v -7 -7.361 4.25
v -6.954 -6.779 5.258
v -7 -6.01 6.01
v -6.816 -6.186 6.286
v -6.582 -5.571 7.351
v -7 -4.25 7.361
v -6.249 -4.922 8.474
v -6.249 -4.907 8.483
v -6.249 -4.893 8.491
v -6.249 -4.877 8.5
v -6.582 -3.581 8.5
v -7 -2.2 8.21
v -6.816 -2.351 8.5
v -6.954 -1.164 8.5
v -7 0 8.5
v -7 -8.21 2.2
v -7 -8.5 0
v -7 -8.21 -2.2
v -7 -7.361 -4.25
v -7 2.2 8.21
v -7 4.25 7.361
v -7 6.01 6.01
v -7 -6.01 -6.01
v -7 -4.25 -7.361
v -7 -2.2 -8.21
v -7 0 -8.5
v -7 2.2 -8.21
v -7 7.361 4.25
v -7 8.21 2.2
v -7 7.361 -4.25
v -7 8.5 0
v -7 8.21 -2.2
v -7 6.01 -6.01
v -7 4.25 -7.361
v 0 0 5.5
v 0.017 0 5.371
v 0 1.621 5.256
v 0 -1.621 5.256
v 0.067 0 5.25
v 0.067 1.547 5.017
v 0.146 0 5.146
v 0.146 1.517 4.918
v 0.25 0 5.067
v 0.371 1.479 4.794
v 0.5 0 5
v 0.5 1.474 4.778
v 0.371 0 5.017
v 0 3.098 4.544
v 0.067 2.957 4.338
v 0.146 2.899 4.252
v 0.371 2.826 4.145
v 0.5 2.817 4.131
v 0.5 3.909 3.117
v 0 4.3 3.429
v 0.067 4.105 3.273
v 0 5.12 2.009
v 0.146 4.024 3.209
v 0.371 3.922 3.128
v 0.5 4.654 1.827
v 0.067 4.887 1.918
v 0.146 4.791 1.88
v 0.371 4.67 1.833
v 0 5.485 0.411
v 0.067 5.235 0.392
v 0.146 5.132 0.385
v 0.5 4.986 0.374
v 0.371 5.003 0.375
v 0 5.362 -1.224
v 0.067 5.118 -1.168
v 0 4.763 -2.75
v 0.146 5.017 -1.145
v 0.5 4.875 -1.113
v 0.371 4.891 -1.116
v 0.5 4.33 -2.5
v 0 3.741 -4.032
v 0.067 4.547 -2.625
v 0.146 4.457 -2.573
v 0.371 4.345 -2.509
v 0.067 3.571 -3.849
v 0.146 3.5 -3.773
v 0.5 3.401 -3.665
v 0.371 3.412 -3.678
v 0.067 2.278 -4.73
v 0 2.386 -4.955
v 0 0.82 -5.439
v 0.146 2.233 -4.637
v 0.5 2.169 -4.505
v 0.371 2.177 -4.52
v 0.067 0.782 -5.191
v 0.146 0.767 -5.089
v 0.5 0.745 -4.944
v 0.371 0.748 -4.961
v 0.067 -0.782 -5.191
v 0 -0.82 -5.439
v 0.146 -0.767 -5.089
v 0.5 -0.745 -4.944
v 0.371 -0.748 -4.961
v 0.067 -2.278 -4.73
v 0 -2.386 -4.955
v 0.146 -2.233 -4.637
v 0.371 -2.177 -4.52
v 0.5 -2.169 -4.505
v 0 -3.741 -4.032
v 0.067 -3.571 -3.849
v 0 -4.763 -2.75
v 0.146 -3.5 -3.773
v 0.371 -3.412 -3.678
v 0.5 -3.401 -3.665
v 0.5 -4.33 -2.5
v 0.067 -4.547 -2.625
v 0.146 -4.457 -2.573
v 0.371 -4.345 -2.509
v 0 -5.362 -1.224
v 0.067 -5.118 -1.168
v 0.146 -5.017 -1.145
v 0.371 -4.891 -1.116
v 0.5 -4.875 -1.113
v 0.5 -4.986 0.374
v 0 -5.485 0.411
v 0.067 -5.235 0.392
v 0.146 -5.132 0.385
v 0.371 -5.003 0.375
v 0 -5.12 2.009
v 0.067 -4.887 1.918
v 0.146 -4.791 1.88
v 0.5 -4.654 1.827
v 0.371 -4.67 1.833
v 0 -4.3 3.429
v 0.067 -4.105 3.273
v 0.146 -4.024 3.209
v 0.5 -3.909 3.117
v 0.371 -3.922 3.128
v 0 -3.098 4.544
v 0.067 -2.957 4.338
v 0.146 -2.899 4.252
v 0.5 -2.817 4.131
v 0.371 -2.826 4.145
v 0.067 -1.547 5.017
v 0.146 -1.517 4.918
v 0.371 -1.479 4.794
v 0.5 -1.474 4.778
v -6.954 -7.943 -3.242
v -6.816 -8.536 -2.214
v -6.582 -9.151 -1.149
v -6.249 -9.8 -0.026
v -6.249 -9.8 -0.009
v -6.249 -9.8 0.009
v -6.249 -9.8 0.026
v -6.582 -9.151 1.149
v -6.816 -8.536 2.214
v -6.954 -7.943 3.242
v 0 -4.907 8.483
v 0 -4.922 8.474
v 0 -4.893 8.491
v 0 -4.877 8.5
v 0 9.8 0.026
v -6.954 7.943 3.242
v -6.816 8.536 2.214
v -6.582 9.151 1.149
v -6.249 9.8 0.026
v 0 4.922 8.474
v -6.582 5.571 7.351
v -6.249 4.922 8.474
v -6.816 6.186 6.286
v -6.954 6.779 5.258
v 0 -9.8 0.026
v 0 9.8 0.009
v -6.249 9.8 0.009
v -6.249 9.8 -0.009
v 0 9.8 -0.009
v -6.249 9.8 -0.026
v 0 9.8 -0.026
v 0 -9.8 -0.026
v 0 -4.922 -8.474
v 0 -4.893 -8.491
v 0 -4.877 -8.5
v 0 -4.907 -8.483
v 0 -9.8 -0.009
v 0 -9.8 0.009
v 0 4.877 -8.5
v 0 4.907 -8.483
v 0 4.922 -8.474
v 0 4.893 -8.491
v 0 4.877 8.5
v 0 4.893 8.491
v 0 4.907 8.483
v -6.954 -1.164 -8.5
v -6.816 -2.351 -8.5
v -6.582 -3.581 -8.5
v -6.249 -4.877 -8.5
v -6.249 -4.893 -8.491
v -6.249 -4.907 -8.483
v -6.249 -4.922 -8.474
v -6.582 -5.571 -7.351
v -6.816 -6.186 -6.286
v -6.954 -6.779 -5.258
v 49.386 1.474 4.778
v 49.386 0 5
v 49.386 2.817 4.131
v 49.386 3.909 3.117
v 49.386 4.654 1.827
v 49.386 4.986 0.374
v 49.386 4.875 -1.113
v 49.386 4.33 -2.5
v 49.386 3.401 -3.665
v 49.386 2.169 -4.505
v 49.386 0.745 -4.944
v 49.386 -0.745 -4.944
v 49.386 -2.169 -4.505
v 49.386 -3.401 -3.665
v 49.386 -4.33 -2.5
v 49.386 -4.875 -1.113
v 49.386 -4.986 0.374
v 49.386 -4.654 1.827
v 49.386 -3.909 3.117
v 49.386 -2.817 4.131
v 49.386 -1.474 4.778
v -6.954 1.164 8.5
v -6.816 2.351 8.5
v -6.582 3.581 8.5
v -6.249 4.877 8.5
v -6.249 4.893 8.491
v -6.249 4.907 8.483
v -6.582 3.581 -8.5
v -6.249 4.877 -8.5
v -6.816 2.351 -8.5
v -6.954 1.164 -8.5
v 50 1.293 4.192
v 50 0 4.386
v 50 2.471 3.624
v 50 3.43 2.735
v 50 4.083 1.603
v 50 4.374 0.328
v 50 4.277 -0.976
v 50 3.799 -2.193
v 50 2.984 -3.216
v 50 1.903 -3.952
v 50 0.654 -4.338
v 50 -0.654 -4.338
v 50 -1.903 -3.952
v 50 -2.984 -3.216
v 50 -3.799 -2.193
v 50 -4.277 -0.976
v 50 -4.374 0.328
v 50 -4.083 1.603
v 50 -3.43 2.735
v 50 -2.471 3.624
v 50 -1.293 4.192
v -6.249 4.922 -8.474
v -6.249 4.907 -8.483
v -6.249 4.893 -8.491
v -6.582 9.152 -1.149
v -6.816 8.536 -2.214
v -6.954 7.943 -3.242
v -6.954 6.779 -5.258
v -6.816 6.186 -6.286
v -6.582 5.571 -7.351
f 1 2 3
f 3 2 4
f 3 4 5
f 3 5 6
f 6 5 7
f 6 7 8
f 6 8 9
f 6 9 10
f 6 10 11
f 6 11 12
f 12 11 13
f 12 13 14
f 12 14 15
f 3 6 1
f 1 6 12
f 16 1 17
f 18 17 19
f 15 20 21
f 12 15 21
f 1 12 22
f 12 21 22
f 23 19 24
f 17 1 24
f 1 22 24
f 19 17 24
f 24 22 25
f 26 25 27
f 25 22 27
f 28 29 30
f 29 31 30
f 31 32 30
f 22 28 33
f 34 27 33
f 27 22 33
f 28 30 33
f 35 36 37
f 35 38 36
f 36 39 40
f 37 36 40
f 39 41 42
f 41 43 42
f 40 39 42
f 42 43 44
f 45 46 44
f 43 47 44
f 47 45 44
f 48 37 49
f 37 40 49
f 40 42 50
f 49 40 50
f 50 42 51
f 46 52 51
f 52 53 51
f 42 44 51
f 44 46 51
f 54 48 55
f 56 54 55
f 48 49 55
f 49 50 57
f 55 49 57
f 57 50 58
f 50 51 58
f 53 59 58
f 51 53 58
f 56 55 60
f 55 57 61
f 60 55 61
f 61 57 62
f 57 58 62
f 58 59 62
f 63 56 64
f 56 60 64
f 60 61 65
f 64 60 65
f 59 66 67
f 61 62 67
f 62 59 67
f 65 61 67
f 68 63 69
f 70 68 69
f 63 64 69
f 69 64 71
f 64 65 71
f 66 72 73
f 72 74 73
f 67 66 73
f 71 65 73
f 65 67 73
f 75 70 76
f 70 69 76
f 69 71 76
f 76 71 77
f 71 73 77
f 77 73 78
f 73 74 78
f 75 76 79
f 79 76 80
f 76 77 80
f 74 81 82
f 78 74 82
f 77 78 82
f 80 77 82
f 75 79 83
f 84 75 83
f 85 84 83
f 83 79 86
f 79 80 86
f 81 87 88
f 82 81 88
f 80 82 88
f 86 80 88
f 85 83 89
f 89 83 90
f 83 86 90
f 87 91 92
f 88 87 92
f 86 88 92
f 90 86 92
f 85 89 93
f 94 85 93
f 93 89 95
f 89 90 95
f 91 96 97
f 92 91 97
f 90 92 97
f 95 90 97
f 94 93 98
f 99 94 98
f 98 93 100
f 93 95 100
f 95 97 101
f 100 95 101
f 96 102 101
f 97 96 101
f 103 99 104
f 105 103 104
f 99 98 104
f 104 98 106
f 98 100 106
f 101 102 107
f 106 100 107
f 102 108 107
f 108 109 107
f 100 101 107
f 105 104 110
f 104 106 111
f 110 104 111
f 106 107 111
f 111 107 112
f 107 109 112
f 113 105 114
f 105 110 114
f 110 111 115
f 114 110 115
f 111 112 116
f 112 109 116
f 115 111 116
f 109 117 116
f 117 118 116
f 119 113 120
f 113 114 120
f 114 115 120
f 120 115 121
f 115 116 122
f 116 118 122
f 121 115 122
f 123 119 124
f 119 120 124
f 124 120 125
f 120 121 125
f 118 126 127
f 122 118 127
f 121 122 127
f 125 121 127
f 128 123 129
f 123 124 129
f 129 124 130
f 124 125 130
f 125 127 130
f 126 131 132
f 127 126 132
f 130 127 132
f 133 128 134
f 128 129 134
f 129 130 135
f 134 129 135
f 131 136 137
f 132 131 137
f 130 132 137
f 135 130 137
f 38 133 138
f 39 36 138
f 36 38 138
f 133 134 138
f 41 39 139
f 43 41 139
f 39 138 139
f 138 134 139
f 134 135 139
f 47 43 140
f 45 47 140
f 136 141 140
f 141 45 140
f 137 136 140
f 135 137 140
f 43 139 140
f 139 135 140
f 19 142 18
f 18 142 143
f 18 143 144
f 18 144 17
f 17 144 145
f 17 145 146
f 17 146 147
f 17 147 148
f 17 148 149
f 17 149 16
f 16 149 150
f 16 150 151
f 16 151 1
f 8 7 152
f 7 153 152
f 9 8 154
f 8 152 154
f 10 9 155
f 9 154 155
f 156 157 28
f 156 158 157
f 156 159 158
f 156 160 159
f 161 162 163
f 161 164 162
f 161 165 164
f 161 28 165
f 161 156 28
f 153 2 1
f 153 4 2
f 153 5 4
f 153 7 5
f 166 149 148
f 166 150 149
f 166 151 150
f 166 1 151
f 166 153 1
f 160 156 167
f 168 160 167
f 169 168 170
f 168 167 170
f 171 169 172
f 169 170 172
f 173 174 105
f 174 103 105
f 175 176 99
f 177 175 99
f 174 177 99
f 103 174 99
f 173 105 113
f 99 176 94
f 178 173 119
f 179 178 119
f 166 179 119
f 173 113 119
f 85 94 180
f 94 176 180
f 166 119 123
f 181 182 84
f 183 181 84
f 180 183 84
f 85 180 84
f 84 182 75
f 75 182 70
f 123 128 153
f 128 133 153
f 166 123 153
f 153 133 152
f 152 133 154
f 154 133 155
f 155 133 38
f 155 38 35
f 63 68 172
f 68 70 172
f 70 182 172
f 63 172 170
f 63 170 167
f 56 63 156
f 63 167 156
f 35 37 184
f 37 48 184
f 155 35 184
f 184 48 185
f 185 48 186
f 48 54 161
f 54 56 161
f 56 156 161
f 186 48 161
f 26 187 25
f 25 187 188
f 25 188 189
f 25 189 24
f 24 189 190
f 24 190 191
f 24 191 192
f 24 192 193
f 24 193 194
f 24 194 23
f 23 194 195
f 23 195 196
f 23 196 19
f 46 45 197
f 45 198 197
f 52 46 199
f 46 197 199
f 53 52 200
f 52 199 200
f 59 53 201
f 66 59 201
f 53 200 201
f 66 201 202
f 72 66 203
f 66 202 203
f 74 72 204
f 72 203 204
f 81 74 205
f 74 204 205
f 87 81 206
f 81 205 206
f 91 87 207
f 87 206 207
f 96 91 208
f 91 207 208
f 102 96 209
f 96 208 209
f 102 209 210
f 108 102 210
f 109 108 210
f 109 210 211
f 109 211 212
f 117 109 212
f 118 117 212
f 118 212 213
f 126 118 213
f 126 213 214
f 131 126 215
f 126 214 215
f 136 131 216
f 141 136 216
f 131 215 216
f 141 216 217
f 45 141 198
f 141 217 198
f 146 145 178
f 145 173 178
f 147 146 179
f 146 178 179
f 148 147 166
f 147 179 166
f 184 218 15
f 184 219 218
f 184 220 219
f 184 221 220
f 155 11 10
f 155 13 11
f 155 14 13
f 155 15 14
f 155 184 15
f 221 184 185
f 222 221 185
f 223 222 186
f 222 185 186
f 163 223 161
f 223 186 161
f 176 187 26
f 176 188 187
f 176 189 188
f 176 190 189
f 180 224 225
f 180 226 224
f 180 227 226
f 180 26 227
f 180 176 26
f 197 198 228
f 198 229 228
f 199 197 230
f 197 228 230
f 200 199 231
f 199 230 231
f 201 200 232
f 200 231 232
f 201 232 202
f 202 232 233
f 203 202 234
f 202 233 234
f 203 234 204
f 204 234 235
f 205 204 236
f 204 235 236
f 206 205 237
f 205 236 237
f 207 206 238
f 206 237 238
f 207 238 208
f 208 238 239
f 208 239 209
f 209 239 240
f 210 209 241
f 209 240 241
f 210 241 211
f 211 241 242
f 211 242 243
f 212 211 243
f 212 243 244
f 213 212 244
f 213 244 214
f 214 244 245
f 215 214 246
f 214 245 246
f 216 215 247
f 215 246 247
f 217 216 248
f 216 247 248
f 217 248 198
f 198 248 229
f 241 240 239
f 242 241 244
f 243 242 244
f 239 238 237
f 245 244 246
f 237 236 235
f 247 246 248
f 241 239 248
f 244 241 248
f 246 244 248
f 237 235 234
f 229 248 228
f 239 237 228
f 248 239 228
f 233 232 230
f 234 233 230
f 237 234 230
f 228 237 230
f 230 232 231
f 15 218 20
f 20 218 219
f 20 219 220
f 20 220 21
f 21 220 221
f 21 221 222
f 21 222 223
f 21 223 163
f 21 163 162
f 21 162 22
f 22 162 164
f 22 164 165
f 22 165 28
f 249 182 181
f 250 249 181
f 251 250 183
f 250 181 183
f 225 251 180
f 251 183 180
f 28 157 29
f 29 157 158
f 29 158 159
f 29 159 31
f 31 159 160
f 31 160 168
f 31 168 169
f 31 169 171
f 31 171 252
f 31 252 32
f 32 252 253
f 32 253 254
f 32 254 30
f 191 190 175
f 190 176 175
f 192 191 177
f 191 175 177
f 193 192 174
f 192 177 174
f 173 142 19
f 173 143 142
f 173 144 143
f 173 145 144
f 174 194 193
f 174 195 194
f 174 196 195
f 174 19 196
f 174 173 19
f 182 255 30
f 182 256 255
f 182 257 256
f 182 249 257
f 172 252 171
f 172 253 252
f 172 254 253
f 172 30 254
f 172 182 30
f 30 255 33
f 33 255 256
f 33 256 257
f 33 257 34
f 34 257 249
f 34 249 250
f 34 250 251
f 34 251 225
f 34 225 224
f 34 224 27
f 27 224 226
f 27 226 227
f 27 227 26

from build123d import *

# Parameters (mm, degrees)
SKETCH2_W          = 39.2
SKETCH2_H          = 39.2
CUT_EXTRUDE1_DEPTH = 7


with BuildPart() as part:
    # Sketch1 → Revolve1 (revolve)
    with BuildSketch(Plane.XY, mode=Mode.PRIVATE) as revolve1_sk:
        with BuildLine():
            Line((-7, 0), (-7, 8.5))
            Line((-7, 8.5), (-6.24944465, 9.8))
            Line((-6.24944465, 9.8), (0, 9.8))
            Line((0, 9.8), (0, 5.5))
            ThreePointArc((0, 5.5), (0.146446609, 5.146446609), (0.5, 5))
            Line((0.5, 5), (49.3865, 5))
            Line((49.3865, 5), (50, 4.3865))
            Line((50, 4.3865), (50, 0))
            Line((50, 0), (-7, 0))
        make_face()
    revolve(revolve1_sk.sketch.rotate(Axis((50, 0, 0), (-1, 0, 0)), 270), axis=Axis((50, 0, 0), (-1, 0, 0)))

    # Sketch2 → Cut-Extrude1 (cut)
    with BuildSketch(Plane(origin=(0, 0, 0), x_dir=(0, 0, -1), z_dir=(1, 0, 0))):
        Rectangle(SKETCH2_W, SKETCH2_H)
        Polygon((-8.5, 4.907477288), (-8.5, -4.907477288), (0, -9.814954576), (8.5, -4.907477288), (8.5, 4.907477288), (0, 9.814954576), align=None, mode=Mode.SUBTRACT)
    extrude(amount=-CUT_EXTRUDE1_DEPTH, mode=Mode.SUBTRACT)


solid = part.part
